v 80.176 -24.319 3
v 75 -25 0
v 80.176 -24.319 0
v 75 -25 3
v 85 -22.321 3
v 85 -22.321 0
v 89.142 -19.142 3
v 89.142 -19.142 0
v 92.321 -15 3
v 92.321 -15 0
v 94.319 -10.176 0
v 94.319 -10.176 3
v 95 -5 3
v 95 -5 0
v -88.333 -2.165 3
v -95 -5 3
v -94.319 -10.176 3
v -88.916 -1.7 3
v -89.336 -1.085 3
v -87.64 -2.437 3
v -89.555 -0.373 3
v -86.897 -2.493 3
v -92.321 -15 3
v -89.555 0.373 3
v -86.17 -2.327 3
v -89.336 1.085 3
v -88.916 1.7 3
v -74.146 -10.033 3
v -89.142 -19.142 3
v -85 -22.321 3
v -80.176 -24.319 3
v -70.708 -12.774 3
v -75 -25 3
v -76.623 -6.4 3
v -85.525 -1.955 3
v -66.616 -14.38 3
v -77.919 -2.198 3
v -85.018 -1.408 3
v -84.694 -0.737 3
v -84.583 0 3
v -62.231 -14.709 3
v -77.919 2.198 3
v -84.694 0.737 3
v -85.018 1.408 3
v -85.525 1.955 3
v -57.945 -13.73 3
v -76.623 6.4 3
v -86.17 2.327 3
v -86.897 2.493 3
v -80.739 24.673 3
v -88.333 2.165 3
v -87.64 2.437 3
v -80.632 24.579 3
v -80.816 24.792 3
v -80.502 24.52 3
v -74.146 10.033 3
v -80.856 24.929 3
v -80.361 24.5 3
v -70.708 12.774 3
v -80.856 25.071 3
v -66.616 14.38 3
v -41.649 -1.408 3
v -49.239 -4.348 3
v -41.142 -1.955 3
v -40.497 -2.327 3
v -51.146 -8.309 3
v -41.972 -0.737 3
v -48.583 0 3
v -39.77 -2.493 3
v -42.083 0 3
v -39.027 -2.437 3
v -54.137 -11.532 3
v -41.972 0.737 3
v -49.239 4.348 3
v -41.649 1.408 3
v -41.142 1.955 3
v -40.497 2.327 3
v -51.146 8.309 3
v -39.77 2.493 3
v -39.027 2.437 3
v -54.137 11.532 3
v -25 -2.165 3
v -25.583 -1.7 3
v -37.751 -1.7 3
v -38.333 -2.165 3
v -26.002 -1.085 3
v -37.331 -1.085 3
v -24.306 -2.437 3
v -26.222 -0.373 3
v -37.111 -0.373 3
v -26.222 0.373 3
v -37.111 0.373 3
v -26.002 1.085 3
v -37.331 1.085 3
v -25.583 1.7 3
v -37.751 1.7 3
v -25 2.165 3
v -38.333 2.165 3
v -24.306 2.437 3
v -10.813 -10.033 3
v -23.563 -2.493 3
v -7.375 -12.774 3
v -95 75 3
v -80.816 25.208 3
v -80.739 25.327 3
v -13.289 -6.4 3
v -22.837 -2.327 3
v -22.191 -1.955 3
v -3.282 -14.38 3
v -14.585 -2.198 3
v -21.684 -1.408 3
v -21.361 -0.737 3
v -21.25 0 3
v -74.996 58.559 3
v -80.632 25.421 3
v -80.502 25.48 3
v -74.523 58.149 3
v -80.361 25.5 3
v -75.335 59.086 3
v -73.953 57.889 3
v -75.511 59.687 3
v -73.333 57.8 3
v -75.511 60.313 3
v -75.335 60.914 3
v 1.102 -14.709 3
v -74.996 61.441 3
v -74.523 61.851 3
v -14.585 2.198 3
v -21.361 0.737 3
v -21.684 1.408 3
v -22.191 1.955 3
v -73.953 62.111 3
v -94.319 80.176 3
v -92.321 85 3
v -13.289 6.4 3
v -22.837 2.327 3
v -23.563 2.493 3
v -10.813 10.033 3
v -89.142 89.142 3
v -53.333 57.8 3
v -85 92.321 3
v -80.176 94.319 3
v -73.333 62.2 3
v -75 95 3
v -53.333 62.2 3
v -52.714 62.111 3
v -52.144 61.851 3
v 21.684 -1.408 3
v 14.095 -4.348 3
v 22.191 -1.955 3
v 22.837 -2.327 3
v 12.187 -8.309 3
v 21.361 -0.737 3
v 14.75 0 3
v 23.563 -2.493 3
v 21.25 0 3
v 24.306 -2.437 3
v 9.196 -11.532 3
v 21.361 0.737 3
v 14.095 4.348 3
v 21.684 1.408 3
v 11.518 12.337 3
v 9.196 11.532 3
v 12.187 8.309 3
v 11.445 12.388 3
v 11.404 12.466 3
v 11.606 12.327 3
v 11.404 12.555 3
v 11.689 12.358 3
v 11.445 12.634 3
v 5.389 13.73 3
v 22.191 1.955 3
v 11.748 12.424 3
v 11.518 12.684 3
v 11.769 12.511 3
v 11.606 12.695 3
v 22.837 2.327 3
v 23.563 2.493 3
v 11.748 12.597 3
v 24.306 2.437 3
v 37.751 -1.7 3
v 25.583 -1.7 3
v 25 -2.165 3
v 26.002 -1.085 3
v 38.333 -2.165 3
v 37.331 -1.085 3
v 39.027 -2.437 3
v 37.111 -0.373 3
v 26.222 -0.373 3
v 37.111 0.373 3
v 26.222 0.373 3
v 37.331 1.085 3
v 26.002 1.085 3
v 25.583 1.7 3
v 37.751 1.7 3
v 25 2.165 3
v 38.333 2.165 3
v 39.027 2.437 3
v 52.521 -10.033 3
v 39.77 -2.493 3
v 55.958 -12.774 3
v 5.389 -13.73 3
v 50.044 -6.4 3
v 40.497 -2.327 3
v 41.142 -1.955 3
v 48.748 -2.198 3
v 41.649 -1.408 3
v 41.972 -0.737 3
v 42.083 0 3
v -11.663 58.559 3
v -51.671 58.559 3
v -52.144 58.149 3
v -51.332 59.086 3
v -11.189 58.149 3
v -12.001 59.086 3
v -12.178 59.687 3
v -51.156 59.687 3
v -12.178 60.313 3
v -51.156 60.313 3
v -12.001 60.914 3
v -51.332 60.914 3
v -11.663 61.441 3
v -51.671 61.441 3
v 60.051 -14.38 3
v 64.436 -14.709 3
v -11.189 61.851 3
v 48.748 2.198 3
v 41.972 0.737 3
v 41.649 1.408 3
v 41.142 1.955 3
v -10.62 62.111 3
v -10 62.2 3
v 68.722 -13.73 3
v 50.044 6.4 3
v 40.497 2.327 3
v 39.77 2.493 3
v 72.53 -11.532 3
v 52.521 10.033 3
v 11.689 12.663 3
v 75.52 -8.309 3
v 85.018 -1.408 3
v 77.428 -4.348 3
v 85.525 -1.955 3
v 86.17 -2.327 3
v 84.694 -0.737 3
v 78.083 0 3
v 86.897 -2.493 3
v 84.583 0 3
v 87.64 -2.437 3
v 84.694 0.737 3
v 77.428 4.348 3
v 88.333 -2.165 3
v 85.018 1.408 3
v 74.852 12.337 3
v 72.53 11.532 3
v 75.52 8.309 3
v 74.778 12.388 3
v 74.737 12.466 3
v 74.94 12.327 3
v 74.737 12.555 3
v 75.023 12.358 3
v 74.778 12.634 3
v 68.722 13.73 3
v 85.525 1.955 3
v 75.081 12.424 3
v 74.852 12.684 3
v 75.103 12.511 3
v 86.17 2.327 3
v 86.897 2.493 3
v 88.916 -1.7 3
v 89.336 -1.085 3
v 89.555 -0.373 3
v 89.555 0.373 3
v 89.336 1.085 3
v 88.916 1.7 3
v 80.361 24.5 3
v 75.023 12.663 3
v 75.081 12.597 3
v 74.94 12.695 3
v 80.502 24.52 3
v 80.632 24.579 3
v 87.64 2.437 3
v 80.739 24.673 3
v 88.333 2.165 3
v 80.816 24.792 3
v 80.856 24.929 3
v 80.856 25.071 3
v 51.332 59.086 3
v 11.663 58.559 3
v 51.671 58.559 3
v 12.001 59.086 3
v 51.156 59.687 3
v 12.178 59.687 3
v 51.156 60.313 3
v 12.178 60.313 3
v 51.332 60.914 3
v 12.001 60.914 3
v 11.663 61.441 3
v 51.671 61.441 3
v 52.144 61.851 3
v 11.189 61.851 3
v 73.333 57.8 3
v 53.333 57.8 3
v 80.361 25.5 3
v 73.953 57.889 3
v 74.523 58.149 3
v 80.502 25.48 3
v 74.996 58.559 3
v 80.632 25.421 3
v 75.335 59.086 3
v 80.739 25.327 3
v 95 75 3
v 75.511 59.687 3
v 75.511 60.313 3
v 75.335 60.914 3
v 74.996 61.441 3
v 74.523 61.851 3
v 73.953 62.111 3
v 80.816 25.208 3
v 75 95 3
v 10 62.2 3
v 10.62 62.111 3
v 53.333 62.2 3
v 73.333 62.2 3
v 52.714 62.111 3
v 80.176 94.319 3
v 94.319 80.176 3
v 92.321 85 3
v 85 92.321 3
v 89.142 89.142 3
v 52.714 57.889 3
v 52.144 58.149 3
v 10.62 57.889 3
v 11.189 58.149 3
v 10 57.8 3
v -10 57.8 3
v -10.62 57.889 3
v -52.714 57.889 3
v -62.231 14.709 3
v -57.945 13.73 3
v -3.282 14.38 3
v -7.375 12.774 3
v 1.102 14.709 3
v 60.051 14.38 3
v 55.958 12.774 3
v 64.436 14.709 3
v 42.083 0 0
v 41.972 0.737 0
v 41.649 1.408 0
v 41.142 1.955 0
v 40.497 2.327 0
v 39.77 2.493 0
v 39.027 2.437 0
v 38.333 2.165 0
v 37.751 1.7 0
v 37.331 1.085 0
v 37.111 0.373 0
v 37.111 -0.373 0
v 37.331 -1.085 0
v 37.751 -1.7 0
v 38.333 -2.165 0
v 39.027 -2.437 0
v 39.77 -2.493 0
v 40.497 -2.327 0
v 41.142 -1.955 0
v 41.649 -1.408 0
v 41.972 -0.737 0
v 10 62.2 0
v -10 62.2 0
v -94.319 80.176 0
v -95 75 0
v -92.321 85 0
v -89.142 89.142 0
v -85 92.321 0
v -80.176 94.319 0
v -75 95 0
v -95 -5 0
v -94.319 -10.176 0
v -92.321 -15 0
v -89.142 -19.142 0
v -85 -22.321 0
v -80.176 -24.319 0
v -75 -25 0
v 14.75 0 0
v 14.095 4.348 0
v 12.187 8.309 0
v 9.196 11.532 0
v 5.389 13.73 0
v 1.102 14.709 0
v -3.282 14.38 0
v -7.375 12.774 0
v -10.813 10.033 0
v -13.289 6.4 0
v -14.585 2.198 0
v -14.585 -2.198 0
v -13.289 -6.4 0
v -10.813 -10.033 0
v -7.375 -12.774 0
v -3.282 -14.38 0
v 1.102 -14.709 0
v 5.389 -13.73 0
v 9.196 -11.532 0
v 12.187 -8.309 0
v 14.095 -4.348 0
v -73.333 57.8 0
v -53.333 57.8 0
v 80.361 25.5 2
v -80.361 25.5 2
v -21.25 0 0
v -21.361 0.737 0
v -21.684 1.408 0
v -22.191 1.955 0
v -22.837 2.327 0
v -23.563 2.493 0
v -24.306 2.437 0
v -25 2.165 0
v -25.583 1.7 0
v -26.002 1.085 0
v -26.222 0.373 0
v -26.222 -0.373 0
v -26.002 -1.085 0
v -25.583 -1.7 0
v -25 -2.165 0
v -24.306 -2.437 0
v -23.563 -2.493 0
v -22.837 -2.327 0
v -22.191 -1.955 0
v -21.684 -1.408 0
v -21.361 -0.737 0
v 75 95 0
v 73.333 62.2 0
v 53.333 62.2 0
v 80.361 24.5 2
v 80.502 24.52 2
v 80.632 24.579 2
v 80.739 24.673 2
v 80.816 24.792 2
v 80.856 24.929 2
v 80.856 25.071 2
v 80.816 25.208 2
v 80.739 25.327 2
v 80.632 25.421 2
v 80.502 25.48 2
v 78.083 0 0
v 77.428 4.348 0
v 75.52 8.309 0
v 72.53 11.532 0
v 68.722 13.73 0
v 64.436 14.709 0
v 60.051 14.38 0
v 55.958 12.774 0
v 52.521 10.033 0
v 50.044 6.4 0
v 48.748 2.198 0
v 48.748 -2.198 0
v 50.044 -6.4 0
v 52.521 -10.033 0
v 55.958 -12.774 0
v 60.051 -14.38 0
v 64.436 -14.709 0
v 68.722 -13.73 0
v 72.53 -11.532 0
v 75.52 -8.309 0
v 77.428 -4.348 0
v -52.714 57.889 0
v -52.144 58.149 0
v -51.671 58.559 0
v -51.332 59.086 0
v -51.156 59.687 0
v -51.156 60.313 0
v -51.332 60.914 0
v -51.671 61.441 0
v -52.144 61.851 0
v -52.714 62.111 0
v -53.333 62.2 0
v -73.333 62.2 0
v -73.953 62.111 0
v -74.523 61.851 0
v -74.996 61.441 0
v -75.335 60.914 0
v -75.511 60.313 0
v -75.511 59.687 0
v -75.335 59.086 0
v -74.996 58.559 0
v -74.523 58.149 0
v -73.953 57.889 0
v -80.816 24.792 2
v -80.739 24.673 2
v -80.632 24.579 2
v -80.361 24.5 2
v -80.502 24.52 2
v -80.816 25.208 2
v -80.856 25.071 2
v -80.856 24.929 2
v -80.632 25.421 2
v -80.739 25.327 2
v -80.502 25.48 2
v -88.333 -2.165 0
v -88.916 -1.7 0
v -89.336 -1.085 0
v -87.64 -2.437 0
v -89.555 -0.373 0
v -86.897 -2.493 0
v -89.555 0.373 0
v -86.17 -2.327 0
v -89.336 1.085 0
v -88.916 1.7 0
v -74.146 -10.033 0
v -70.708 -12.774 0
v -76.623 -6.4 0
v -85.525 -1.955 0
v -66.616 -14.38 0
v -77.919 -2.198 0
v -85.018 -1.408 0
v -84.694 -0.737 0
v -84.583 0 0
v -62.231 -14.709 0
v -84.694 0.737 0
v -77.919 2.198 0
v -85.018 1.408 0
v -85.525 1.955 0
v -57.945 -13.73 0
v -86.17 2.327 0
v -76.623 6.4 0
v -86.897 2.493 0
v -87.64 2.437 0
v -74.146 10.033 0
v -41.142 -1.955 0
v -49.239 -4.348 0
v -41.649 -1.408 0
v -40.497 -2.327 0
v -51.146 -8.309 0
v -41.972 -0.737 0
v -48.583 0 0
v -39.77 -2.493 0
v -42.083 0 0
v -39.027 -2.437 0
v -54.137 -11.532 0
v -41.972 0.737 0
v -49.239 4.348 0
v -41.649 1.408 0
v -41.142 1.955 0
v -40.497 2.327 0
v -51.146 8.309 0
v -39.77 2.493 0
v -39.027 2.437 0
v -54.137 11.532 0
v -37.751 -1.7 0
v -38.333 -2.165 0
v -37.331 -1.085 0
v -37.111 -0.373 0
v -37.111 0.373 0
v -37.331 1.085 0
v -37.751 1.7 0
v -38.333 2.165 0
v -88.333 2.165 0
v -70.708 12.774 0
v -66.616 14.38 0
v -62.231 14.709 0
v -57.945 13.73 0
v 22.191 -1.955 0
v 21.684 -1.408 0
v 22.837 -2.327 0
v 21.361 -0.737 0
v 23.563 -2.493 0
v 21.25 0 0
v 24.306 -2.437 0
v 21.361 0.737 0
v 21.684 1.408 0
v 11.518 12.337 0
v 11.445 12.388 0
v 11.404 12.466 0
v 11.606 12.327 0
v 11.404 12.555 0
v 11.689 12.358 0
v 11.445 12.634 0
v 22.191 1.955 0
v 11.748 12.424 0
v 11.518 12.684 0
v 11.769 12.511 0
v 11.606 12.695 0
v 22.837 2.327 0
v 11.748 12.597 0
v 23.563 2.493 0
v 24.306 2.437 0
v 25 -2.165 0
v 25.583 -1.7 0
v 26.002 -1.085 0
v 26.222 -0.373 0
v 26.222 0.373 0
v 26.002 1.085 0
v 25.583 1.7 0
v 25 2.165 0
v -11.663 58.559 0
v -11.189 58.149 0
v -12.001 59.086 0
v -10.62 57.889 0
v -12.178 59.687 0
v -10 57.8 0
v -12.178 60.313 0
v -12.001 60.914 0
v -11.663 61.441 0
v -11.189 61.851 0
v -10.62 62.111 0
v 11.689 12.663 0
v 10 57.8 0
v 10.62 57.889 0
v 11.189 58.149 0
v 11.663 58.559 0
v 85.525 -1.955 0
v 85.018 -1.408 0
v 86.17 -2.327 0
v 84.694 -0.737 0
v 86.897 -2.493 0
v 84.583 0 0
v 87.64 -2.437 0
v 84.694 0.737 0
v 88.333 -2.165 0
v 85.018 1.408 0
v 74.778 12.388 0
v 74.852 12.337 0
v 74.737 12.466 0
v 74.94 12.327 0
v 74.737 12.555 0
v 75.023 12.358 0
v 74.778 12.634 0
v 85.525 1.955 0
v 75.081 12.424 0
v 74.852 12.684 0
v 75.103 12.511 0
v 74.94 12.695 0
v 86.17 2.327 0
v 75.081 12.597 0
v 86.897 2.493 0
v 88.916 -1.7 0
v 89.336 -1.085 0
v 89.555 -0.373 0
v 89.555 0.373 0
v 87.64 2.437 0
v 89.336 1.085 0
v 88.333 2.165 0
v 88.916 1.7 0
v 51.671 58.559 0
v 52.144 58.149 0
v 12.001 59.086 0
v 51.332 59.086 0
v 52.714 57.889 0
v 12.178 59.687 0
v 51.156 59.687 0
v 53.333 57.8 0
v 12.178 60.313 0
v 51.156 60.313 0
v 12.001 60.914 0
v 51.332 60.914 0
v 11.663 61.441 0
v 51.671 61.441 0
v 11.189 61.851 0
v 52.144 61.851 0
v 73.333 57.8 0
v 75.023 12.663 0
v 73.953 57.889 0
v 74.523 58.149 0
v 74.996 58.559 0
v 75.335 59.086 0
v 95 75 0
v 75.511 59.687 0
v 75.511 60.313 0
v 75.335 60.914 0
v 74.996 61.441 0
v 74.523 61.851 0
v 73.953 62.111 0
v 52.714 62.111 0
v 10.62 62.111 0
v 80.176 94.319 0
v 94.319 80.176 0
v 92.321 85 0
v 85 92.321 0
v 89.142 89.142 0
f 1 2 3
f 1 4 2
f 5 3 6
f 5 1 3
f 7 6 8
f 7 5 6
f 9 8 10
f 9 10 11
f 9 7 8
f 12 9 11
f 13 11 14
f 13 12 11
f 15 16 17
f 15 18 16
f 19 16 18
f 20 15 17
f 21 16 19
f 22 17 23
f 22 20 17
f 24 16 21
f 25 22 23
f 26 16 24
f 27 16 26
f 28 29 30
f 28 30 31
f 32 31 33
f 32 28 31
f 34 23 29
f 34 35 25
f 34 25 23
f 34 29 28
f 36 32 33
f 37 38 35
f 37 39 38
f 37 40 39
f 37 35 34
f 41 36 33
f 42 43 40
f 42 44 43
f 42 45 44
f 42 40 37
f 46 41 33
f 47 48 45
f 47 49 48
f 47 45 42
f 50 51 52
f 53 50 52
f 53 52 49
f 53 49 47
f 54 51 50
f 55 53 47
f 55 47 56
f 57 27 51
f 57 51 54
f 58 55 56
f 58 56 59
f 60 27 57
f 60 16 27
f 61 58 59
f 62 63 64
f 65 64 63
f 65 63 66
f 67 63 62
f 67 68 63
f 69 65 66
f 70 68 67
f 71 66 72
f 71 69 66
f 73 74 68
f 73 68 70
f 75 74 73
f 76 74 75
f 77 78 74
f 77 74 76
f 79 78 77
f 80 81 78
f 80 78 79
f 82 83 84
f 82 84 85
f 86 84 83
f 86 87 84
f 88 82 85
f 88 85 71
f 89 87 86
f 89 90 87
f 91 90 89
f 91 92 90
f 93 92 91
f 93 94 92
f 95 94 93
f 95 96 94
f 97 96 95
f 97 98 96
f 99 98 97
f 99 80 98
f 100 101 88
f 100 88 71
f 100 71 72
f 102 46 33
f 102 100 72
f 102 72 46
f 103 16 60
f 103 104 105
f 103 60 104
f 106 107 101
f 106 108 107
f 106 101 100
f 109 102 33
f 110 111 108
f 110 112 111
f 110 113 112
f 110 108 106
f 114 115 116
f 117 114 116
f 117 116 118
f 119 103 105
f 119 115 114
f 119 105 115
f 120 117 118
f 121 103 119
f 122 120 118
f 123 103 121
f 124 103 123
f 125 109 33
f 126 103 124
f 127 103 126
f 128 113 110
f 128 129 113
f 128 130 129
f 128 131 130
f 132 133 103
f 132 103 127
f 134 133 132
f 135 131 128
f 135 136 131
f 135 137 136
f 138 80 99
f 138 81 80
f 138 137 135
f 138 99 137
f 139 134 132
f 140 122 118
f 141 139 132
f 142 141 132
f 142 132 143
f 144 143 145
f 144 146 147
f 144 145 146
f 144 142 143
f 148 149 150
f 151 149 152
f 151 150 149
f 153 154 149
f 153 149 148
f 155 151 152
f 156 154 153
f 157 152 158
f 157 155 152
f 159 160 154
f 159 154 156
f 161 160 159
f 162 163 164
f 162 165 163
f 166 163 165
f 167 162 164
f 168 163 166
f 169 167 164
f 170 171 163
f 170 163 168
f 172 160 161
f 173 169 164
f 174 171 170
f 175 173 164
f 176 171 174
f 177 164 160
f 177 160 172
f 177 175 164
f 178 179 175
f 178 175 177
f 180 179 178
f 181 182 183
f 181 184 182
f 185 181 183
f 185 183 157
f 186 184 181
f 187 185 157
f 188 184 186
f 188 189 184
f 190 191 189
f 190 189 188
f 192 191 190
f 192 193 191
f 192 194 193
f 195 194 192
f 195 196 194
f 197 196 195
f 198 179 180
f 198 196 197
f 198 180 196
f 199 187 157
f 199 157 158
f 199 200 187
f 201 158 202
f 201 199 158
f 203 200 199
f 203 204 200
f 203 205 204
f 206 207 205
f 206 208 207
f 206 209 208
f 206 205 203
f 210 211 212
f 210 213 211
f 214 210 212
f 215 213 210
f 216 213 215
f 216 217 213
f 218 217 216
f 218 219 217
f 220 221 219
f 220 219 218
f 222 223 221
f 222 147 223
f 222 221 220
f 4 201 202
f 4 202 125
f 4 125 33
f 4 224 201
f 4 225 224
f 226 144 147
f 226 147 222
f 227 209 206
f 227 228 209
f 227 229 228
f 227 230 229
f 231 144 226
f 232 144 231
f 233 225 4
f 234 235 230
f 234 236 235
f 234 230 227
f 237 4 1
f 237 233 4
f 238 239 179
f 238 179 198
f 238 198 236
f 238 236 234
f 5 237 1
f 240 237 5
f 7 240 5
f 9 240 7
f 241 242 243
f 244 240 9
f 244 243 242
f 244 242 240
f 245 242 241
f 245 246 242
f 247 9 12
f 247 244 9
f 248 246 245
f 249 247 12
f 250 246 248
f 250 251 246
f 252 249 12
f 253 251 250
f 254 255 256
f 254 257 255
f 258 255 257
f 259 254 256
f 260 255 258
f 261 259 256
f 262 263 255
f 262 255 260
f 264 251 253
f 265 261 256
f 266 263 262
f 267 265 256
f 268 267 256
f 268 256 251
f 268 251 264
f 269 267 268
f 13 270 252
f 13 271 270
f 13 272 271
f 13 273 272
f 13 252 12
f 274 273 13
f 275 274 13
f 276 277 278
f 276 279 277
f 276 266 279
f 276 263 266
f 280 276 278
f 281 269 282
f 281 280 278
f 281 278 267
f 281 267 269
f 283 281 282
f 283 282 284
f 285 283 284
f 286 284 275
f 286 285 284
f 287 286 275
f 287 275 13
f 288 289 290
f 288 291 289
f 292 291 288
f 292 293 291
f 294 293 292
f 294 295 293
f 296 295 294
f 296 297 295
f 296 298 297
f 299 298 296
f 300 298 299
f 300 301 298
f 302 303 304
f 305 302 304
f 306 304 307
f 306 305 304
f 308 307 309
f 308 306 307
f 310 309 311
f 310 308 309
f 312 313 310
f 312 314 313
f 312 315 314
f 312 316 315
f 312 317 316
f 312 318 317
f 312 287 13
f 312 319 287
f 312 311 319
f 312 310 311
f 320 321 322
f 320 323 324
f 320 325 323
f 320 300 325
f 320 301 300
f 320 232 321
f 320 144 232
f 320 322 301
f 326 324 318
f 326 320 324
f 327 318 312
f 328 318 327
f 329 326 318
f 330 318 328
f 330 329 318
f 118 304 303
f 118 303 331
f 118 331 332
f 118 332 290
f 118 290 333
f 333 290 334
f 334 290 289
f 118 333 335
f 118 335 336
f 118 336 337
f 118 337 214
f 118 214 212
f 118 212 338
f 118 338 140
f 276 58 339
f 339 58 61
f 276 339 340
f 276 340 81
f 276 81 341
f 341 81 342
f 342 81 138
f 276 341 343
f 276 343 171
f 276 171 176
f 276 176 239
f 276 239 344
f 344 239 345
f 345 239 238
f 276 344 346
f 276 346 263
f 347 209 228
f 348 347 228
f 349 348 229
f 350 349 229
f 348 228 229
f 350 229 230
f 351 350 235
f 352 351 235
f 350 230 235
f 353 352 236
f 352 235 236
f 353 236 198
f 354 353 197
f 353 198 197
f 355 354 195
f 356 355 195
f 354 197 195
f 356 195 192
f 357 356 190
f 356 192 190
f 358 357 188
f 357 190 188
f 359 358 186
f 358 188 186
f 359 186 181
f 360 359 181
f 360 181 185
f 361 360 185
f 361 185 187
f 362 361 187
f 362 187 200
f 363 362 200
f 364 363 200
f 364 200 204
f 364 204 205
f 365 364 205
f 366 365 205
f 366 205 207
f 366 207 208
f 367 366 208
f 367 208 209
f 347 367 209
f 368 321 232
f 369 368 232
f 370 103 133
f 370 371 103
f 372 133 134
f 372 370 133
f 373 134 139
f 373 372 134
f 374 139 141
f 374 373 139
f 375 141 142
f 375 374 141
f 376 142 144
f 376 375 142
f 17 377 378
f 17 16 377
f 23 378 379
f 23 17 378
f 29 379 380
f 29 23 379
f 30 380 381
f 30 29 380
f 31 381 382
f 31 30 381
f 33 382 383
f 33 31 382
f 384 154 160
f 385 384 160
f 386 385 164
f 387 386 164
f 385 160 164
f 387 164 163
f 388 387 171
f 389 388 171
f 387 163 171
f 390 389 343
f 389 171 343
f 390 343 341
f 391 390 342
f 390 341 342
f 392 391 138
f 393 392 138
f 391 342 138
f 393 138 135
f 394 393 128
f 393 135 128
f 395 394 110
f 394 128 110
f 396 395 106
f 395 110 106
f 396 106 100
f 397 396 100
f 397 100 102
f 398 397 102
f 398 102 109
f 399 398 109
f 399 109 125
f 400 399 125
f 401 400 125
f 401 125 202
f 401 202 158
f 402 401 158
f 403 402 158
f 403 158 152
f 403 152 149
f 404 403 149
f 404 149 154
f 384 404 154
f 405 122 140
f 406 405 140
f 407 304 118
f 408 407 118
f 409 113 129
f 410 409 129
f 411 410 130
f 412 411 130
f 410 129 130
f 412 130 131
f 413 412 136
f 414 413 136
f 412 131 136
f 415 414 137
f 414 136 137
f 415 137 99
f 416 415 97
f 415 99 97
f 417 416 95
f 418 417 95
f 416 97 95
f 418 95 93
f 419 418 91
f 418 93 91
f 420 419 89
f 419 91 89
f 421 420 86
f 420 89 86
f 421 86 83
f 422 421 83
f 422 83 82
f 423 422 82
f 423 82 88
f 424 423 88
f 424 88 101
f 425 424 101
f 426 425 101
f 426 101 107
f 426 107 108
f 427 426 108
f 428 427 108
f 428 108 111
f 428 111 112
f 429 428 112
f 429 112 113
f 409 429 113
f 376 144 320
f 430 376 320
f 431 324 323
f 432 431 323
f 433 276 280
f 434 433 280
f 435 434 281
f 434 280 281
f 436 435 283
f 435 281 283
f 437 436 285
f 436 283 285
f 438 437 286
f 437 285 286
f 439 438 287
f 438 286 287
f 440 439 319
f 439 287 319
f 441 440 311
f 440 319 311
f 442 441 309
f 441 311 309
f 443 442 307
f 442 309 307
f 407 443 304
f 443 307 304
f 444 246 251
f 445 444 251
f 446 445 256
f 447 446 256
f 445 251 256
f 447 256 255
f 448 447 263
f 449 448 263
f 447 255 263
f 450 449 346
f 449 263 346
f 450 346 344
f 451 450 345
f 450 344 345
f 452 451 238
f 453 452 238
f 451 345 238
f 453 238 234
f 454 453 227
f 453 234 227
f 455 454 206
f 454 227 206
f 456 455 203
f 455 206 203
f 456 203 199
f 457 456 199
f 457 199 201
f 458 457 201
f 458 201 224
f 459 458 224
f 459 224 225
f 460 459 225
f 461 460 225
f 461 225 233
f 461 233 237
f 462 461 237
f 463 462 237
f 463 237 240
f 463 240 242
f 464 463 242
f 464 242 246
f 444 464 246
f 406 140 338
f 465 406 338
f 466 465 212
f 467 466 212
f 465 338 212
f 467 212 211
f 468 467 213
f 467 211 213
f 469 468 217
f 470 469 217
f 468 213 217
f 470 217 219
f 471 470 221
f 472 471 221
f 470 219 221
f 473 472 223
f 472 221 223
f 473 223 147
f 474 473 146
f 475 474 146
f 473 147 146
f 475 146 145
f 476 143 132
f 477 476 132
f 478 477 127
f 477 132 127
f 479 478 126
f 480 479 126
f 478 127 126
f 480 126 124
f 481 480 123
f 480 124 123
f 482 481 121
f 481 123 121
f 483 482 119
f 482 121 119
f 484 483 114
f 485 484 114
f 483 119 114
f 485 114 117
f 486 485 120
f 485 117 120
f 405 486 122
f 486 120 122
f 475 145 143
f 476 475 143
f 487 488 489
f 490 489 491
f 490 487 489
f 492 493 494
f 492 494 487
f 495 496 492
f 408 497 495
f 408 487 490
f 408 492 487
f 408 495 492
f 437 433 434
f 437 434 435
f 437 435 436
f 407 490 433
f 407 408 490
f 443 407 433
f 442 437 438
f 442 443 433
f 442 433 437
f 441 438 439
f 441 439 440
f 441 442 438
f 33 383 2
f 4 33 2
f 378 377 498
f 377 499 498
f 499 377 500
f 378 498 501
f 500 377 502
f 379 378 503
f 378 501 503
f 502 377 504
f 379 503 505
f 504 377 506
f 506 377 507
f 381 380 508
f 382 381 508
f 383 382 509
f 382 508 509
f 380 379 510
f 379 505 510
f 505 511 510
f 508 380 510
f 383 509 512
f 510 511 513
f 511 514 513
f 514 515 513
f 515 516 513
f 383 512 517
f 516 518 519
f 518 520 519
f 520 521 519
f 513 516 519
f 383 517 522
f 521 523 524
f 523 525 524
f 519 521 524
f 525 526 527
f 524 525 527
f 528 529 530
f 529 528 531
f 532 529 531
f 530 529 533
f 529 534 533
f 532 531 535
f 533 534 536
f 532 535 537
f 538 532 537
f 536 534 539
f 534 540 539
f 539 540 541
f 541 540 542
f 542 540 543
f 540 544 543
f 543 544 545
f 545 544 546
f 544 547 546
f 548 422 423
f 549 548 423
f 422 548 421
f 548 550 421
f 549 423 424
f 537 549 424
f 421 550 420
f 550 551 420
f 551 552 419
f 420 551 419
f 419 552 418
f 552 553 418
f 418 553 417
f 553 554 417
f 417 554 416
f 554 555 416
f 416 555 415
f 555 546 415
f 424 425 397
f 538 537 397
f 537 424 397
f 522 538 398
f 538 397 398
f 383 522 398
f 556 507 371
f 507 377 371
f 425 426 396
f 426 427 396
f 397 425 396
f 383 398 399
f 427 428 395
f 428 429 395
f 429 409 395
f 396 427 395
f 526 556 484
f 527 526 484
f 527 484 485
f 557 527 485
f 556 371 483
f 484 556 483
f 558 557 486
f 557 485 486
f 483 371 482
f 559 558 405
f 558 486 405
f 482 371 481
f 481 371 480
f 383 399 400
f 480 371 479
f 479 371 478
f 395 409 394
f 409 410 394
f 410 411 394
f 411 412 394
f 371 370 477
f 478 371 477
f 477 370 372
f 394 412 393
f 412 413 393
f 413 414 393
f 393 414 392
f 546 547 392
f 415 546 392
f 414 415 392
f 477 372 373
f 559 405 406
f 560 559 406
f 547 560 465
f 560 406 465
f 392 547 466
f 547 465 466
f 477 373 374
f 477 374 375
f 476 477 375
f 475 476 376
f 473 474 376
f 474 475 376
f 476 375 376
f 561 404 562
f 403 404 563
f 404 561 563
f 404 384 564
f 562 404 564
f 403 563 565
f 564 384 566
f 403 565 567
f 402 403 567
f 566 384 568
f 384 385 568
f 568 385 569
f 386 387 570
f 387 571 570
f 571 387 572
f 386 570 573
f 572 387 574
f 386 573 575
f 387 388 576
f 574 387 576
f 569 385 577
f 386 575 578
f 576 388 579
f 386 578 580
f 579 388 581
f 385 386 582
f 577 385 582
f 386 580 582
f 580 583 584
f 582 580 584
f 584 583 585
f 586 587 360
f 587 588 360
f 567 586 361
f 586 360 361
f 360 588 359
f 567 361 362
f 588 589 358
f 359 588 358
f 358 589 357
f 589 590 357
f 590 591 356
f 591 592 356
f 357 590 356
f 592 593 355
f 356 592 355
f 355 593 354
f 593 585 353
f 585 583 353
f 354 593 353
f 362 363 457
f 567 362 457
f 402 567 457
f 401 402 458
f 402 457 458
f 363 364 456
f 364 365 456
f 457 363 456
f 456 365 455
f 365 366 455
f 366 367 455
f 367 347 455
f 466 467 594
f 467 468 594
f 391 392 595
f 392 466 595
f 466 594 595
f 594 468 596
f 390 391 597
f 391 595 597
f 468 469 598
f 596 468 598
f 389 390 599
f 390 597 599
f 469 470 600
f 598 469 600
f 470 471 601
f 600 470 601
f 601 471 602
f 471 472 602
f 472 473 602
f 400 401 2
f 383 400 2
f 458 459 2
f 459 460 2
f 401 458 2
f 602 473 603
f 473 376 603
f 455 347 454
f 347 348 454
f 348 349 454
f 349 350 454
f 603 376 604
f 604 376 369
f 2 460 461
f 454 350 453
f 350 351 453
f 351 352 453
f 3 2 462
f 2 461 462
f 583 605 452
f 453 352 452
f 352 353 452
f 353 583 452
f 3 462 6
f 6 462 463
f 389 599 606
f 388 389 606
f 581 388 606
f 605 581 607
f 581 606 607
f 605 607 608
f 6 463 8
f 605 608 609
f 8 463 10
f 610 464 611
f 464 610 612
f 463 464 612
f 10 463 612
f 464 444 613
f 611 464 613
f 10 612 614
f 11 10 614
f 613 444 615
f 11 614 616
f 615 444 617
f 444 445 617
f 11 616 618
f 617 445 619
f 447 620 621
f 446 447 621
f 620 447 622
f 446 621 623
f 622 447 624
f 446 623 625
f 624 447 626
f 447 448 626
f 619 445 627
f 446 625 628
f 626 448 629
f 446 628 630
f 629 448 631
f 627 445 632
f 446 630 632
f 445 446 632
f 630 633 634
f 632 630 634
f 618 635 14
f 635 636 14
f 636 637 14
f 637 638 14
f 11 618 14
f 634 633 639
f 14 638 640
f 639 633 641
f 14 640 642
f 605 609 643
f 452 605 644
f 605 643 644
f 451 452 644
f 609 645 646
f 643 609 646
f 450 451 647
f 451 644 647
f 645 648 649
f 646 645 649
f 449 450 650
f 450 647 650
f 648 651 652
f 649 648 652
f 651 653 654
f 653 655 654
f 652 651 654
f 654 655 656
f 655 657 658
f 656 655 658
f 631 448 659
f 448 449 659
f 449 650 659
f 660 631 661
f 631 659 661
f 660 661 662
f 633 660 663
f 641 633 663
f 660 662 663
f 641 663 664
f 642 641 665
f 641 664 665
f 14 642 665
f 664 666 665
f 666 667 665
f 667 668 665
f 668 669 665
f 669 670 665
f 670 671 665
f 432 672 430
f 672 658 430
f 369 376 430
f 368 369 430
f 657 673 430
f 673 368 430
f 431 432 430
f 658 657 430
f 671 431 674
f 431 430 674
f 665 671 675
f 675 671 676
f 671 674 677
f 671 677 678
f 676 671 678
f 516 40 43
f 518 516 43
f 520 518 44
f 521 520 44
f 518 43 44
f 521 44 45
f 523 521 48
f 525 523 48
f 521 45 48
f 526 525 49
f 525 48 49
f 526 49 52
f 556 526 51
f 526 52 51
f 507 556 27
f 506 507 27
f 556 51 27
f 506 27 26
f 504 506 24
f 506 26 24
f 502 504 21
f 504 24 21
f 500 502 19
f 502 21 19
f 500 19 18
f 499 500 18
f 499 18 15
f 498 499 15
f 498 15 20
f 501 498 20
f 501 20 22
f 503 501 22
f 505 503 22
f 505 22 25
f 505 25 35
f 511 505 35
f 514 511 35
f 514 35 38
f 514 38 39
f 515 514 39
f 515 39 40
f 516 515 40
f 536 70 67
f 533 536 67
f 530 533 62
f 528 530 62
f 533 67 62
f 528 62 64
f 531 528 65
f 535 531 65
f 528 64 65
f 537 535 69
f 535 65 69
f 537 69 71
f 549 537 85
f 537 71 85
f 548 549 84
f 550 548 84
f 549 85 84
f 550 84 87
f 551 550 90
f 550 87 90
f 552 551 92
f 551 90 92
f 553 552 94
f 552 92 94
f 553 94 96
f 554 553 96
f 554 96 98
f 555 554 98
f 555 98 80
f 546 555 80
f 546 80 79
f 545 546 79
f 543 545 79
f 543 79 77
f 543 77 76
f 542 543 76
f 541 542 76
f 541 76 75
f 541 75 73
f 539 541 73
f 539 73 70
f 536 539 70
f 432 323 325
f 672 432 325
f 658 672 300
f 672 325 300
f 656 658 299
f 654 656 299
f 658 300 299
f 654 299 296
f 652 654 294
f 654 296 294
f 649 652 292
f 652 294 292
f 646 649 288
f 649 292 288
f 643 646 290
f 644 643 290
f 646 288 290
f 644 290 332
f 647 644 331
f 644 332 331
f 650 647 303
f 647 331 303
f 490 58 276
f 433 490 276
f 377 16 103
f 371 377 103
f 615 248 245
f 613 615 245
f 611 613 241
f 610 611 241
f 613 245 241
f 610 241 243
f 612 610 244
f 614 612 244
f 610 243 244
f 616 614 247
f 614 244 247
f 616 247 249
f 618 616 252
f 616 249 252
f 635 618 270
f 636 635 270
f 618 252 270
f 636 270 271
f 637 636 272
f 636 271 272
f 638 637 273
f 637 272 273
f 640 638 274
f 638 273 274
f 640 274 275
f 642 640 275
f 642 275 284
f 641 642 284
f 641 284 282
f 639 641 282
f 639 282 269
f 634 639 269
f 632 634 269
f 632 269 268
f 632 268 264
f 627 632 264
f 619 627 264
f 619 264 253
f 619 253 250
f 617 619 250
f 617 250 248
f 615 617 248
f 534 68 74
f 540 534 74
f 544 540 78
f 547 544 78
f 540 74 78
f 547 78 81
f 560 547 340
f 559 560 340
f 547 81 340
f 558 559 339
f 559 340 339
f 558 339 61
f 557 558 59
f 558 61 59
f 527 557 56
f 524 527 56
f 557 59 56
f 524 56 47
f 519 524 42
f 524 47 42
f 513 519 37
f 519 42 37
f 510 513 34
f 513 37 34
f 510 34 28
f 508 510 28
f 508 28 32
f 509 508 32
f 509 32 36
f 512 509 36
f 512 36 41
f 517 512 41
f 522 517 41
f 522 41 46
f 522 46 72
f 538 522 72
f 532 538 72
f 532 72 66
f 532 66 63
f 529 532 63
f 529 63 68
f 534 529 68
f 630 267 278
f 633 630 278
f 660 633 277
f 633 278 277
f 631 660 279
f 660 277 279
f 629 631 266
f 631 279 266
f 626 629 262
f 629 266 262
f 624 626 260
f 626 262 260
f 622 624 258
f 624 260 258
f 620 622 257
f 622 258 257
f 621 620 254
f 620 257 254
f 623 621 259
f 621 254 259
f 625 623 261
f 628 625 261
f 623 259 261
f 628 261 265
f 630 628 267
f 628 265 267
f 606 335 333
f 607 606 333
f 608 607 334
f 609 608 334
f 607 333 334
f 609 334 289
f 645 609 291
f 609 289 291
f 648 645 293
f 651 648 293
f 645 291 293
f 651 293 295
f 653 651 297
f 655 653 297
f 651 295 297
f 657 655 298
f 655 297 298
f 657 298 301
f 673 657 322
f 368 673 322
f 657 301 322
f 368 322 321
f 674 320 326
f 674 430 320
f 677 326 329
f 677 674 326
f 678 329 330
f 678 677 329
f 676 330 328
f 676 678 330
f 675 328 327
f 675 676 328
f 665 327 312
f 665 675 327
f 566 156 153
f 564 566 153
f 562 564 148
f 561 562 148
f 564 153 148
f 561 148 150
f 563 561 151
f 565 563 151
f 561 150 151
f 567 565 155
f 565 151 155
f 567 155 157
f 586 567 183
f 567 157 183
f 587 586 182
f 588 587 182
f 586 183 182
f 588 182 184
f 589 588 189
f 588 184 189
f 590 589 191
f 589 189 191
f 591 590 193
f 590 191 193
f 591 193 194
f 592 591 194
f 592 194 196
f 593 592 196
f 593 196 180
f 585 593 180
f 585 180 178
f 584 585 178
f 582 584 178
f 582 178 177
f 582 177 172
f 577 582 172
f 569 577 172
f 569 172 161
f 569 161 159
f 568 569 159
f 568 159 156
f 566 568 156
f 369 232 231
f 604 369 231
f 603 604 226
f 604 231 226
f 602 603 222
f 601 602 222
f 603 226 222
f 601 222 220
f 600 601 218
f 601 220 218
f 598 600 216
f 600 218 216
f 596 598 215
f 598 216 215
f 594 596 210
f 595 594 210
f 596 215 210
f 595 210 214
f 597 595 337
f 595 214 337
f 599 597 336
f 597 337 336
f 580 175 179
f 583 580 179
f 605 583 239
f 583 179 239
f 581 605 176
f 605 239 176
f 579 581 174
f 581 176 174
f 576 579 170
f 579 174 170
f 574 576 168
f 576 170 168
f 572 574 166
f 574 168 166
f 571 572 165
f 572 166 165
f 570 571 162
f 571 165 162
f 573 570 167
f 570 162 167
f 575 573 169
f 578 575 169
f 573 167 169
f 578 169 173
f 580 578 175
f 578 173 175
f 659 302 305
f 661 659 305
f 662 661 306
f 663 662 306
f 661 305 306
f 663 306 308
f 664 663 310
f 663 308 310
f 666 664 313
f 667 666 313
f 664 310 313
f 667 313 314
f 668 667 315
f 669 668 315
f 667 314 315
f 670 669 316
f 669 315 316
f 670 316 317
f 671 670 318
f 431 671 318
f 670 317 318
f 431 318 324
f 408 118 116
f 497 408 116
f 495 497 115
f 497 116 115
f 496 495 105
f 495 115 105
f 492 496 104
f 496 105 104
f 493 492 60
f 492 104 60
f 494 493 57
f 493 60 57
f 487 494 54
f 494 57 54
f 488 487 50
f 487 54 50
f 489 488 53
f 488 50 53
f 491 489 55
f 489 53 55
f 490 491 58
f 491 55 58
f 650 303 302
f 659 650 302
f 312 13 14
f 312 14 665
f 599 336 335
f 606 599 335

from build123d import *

# Parameters (mm, degrees)
SKETCH1_W           = 190
SKETCH1_H           = 50
BOSS_EXTRUDE1_DEPTH = 3
SKETCH2_R           = 14.75
SKETCH2_R_2         = 0.185342338
SKETCH2_R_3         = 2.5
CUT_EXTRUDE1_DEPTH  = 99.28021164
LPATTERN1_COUNT     = 3
LPATTERN1_PITCH     = 63.333333333
SKETCH3_W           = 190
SKETCH3_H           = 70
BOSS_EXTRUDE2_DEPTH = 3
CUT_EXTRUDE2_DEPTH  = 3
LPATTERN2_COUNT     = 3
LPATTERN2_PITCH     = 63.333333333
CUT_EXTRUDE3_DEPTH  = 1
FILLET1_R           = 20
FILLET2_R           = 20


with BuildPart() as part:
    # Sketch1 → Boss-Extrude1 (new body)
    with BuildSketch(Plane.XY):
        Rectangle(SKETCH1_W, SKETCH1_H)
    extrude(amount=BOSS_EXTRUDE1_DEPTH)

    # Sketch2 → Cut-Extrude1 (cut, through all)
    with BuildSketch(Plane.XY.offset(3)):
        with Locations((-63.333333333, 0)):
            Circle(SKETCH2_R)
        with Locations((11.583896138, 12.510607829)):
            Circle(SKETCH2_R_2)
        with Locations((-87.083333333, 0)):
            Circle(SKETCH2_R_3)
        with Locations(Location((-39.583333333, 0, 0), (0, 0, 180))):
            Circle(SKETCH2_R_3)
    cut_extrude1 = extrude(amount=-CUT_EXTRUDE1_DEPTH, mode=Mode.SUBTRACT)

    # LPattern1: Cut-Extrude1 ×3
    with Locations(*[(i * LPATTERN1_PITCH, 0, 0) for i in range(1, LPATTERN1_COUNT)]):
        add(cut_extrude1, mode=Mode.SUBTRACT)

    # Sketch3 → Boss-Extrude2 (add)
    with BuildSketch(Plane.XY.offset(3)):
        with Locations((0, 60)):
            Rectangle(SKETCH3_W, SKETCH3_H)
    extrude(amount=-BOSS_EXTRUDE2_DEPTH)

    # Sketch3<3> → Cut-Extrude2 (cut)
    with BuildSketch(Plane.XY.offset(3)):
        with BuildLine():
            Line((73.333333333, 62.2), (53.333333333, 62.2))
            ThreePointArc((53.333333333, 62.2), (51.133333333, 60), (53.333333333, 57.8))
            Line((53.333333333, 57.8), (73.333333333, 57.8))
            ThreePointArc((73.333333333, 57.8), (75.533333333, 60), (73.333333333, 62.2))
        make_face()
    cut_extrude2 = extrude(amount=-CUT_EXTRUDE2_DEPTH, mode=Mode.SUBTRACT)

    # LPattern2: Cut-Extrude2 ×3
    with Locations(*[(-i * LPATTERN2_PITCH, 0, 0) for i in range(1, LPATTERN2_COUNT)]):
        add(cut_extrude2, mode=Mode.SUBTRACT)

    # Sketch4 → Cut-Extrude3 (cut)
    with BuildSketch(Plane.XY.offset(3)):
        with BuildLine():
            Line((80.361283663, 25.5), (-80.361283663, 25.5))
            ThreePointArc((-80.361283663, 25.5), (-80.861283663, 25), (-80.361283663, 24.5))
            Line((-80.361283663, 24.5), (80.361283663, 24.5))
            ThreePointArc((80.361283663, 24.5), (80.861283663, 25), (80.361283663, 25.5))
        make_face()
    extrude(amount=-CUT_EXTRUDE3_DEPTH, mode=Mode.SUBTRACT)

    # Fillet1
    fillet1_edges = [part.edges().sort_by_distance(p)[0] for p in [
        (95, -25, 1.5),
        (-95, -25, 1.5),
    ]]
    fillet(fillet1_edges, radius=FILLET1_R)

    # Fillet2
    fillet2_edges = [part.edges().sort_by_distance(p)[0] for p in [
        (95, 95, 1.5),
        (-95, 95, 1.5),
    ]]
    fillet(fillet2_edges, radius=FILLET2_R)


solid = part.part
